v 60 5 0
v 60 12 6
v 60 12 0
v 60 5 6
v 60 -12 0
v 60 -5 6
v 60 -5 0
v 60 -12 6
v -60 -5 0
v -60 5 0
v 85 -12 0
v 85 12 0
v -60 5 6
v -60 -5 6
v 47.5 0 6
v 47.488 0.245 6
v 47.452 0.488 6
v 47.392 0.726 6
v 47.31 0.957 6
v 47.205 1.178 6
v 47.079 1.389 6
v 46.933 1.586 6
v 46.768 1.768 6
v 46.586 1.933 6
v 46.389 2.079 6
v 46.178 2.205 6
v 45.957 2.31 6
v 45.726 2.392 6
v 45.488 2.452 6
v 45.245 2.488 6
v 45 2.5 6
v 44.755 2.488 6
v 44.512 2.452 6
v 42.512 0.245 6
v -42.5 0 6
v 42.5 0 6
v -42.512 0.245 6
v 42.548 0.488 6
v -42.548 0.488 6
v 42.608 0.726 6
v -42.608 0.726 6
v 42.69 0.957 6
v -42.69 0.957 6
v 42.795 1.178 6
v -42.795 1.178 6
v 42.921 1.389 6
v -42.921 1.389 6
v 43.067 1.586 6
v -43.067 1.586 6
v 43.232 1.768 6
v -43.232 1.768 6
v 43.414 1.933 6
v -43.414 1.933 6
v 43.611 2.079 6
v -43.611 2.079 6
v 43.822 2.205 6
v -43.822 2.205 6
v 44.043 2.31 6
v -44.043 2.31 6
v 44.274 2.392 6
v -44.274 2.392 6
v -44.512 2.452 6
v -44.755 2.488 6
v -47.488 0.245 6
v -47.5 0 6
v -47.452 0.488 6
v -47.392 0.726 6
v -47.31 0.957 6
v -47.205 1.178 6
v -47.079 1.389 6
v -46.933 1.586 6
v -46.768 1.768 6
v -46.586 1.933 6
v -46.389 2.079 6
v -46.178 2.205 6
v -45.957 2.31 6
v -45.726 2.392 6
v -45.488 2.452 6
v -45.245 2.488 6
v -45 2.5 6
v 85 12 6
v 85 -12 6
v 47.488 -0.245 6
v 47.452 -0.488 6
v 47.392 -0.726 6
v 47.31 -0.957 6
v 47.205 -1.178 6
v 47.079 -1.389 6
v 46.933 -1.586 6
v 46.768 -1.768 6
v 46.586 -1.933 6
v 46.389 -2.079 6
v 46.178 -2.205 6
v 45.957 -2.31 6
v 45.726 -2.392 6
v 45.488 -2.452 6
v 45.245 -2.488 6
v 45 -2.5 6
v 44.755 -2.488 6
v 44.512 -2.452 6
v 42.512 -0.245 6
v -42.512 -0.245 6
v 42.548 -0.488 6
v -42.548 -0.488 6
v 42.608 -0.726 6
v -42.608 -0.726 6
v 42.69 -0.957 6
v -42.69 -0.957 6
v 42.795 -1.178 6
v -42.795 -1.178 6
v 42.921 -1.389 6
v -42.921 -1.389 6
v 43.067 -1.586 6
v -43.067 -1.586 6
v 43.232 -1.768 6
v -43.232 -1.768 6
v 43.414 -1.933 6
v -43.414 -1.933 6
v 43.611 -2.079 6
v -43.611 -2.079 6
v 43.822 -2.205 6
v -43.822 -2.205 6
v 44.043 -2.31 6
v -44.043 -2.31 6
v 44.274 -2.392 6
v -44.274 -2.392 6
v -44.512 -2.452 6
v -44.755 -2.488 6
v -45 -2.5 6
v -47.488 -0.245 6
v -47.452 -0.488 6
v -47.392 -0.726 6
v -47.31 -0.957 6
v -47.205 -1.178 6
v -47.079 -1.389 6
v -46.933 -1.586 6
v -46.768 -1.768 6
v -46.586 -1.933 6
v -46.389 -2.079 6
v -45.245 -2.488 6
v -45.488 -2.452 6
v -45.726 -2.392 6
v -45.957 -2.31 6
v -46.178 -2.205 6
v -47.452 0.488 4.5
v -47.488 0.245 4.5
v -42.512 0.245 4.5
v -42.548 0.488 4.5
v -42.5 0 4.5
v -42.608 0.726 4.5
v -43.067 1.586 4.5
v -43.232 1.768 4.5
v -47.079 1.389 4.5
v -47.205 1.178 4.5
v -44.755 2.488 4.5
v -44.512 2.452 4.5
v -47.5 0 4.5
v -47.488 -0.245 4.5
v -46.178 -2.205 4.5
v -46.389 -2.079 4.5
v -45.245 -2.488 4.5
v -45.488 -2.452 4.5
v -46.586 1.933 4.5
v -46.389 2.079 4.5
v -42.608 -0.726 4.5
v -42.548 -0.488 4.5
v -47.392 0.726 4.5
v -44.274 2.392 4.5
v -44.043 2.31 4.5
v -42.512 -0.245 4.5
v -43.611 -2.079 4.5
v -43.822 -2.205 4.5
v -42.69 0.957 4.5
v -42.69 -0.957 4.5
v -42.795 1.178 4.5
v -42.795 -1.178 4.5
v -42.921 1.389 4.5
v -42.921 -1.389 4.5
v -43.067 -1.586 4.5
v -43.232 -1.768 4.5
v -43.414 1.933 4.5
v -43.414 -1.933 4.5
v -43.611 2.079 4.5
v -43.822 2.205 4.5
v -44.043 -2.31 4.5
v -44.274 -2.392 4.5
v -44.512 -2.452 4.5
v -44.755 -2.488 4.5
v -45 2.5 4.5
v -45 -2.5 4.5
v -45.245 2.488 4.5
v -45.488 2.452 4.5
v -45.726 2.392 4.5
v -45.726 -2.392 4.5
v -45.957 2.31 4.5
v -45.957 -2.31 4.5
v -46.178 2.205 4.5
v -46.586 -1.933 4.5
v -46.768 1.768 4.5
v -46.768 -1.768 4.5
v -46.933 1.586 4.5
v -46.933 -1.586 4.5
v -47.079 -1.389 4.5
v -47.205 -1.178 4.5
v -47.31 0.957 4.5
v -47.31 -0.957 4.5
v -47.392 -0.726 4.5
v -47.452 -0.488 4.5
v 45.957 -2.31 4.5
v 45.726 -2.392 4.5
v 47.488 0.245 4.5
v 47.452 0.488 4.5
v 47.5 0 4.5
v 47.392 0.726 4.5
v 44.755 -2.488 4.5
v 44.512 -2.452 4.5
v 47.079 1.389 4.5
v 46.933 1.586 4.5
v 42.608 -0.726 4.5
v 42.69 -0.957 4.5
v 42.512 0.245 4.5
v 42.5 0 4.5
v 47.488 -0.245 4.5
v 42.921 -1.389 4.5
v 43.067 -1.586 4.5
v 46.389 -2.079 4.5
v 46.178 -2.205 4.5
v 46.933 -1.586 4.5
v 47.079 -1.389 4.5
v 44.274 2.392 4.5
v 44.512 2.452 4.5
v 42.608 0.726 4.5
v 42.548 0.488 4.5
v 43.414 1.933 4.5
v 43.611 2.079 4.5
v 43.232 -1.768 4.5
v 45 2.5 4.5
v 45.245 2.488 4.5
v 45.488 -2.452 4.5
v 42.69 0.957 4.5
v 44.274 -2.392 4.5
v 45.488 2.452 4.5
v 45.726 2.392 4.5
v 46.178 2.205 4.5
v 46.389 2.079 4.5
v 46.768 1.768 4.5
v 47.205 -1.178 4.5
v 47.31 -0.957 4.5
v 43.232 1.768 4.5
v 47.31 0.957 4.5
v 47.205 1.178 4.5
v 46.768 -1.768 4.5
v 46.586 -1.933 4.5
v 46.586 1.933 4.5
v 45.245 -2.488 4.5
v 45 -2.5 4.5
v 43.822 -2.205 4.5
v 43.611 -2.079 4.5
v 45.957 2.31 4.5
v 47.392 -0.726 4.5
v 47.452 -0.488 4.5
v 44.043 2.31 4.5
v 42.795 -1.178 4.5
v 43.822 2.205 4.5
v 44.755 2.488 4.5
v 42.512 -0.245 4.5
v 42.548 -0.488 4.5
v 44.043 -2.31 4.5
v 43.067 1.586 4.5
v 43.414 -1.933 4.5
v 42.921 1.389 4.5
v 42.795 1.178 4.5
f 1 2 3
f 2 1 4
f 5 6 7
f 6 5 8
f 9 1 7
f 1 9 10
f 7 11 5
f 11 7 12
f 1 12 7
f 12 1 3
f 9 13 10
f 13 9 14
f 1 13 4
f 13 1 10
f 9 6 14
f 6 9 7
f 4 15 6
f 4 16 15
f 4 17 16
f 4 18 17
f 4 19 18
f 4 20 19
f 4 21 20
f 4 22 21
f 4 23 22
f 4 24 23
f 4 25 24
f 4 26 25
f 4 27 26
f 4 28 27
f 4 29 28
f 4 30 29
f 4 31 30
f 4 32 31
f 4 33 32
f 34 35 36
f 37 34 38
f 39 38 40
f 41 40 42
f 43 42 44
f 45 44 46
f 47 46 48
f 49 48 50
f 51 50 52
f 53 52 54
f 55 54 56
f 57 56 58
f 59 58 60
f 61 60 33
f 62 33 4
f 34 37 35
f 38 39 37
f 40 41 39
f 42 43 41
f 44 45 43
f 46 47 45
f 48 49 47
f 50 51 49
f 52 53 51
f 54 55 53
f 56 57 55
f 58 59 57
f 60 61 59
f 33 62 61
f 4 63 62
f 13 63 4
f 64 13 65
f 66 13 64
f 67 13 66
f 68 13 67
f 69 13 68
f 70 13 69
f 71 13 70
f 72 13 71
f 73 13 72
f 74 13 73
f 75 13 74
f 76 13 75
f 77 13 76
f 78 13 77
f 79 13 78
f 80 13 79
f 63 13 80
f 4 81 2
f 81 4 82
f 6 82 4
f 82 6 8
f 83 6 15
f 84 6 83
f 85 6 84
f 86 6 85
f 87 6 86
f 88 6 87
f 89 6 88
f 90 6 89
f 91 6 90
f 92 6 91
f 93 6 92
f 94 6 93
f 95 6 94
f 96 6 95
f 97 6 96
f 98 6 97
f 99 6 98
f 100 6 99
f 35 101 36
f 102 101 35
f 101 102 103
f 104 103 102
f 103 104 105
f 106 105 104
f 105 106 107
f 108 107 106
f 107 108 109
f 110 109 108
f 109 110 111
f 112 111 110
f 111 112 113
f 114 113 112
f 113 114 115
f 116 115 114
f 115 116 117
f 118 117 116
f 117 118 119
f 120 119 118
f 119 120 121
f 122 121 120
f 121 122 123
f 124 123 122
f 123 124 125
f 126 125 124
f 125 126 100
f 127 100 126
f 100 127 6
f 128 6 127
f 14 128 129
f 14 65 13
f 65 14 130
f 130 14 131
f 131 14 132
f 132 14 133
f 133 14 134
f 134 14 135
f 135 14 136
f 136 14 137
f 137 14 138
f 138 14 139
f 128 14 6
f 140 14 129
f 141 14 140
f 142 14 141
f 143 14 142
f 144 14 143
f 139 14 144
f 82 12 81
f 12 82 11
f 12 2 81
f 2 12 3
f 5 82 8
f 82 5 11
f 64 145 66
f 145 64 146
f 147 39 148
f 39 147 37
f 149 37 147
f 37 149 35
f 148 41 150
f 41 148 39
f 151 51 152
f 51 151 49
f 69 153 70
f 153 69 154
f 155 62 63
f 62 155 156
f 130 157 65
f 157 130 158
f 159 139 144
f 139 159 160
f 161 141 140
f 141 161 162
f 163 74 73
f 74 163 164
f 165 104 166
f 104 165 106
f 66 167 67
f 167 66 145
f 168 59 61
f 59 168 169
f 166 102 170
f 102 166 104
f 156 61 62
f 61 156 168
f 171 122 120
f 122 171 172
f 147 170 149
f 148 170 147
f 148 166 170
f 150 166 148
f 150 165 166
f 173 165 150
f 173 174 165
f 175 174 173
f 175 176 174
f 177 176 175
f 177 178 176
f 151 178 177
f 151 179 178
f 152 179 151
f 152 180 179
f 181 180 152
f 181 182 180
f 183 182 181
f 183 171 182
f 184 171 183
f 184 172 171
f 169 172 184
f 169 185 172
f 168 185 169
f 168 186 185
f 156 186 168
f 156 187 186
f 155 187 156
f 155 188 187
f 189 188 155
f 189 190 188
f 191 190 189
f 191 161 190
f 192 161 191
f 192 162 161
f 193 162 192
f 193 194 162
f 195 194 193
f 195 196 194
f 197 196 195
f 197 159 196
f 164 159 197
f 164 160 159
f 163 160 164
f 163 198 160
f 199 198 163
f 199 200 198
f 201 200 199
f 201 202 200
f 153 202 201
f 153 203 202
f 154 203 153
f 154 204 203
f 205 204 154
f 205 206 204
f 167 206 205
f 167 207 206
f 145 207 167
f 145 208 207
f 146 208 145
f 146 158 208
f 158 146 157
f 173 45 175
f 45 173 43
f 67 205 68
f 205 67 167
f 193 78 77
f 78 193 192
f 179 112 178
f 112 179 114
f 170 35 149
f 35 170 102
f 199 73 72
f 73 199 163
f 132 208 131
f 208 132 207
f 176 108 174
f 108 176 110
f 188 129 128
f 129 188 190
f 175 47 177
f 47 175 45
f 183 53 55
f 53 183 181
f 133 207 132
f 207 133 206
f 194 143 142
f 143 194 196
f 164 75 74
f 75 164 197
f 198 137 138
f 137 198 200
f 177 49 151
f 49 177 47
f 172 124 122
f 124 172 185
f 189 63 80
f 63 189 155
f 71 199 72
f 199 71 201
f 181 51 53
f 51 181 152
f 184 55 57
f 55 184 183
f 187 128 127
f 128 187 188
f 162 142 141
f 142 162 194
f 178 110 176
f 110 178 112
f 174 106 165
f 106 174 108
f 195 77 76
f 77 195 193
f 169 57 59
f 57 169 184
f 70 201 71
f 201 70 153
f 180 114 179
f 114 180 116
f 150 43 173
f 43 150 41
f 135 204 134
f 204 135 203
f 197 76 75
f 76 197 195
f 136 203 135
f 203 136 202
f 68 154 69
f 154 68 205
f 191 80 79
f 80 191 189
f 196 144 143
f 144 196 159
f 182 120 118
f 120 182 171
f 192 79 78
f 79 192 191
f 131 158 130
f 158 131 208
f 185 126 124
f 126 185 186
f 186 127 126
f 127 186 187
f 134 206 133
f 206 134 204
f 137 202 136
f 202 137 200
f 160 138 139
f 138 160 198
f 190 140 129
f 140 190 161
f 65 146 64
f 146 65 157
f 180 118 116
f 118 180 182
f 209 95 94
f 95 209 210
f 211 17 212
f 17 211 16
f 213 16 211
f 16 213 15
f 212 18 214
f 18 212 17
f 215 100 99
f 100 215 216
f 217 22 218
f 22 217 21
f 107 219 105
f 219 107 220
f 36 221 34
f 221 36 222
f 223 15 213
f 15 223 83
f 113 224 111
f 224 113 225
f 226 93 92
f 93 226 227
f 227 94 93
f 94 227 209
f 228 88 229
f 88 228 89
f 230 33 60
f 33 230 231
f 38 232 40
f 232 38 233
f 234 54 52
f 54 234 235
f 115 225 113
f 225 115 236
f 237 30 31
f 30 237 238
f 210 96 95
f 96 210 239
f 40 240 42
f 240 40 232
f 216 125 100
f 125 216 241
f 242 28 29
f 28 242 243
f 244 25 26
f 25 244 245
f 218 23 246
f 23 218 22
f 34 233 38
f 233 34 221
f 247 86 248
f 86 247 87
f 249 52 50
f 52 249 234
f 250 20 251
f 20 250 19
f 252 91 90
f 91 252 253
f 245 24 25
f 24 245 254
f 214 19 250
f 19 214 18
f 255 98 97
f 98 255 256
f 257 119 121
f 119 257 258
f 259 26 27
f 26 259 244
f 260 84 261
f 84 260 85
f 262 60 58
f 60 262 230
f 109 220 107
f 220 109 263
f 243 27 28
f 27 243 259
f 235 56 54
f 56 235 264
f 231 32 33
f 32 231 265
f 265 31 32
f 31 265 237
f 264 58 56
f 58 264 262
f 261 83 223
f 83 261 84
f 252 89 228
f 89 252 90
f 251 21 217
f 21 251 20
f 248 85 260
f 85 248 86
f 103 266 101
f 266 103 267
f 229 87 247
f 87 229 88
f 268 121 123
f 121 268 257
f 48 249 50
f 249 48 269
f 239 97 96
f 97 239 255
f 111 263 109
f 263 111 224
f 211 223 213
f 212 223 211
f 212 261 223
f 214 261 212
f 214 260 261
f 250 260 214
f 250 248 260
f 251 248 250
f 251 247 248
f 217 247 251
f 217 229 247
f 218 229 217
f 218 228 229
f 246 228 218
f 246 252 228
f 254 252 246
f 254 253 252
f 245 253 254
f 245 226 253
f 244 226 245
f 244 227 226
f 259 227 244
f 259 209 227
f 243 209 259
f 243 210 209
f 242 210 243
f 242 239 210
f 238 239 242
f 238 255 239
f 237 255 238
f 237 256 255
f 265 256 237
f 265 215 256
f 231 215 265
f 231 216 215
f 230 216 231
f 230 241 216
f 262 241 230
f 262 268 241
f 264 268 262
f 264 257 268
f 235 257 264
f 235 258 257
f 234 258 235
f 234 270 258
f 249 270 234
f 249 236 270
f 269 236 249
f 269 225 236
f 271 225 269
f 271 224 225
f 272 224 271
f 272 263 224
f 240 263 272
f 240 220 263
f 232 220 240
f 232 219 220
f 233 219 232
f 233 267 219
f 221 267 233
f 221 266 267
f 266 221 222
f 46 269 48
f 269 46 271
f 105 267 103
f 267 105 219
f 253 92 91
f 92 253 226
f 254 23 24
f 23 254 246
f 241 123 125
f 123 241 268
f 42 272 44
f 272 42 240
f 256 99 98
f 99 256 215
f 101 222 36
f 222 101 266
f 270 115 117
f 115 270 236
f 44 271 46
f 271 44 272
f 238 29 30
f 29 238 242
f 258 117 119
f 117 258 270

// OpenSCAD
// ==========================================
// PARAMETRIC RAIL & EXTENSION ASSEMBLY
// ==========================================
$fn = 64;

// --- Global Parameters (mm) ---
rail_length   = 120;
rail_width    = 10;
rail_base_h   = 4;
rail_top_h    = 2;

ext_length    = 25;
ext_width     = 24;
ext_base_h    = 4;
ext_top_h     = 2;

// --- Feature Parameters ---
recess_dia    = 5;
recess_depth  = 1.5;
deep_cut_dia  = 8;
deep_cut_depth= 8;
feature_offset= 15;

// --- Reusable Modules ---
module stepped_rail(len, w, base_h, top_h) {
    // Lower base body
    translate([0, 0, base_h/2])
        cube([len, w, base_h], center=true);
    // Shallow full-length top layer
    translate([0, 0, base_h + top_h/2])
        cube([len, w, top_h], center=true);
}

module circular_pocket(d, depth, top_z) {
    translate([0, 0, top_z - depth/2])
        cylinder(h=depth, d=d, center=true);
}

module through_cutout(d, depth, top_z) {
    translate([0, 0, top_z - depth/2])
        cylinder(h=depth, d=d, center=true);
}

// --- Main Geometry Assembly ---
difference() {
    // Positive volume union
    union() {
        // Central slim rail
        stepped_rail(rail_length, rail_width, rail_base_h, rail_top_h);
        // Wider end extension
        translate([rail_length/2 + ext_length/2, 0, 0])
            stepped_rail(ext_length, ext_width, ext_base_h, ext_top_h);
    }

    // --- Subtractive Features ---
    // Rail end shallow recesses
    translate([-rail_length/2 + feature_offset, 0, 0])
        circular_pocket(recess_dia, recess_depth, rail_base_h + rail_top_h);
    translate([rail_length/2 - feature_offset, 0, 0])
        circular_pocket(recess_dia, recess_depth, rail_base_h + rail_top_h);

    // Extension detailing: shallow recess + deep stepped cutout
    translate([rail_length + ext_length/2, -ext_width/4, 0])
        circular_pocket(recess_dia, recess_depth, ext_base_h + ext_top_h);
    translate([rail_length + ext_length/2, ext_width/4, 0])
        through_cutout(deep_cut_dia, deep_cut_depth, ext_base_h + ext_top_h);
}
